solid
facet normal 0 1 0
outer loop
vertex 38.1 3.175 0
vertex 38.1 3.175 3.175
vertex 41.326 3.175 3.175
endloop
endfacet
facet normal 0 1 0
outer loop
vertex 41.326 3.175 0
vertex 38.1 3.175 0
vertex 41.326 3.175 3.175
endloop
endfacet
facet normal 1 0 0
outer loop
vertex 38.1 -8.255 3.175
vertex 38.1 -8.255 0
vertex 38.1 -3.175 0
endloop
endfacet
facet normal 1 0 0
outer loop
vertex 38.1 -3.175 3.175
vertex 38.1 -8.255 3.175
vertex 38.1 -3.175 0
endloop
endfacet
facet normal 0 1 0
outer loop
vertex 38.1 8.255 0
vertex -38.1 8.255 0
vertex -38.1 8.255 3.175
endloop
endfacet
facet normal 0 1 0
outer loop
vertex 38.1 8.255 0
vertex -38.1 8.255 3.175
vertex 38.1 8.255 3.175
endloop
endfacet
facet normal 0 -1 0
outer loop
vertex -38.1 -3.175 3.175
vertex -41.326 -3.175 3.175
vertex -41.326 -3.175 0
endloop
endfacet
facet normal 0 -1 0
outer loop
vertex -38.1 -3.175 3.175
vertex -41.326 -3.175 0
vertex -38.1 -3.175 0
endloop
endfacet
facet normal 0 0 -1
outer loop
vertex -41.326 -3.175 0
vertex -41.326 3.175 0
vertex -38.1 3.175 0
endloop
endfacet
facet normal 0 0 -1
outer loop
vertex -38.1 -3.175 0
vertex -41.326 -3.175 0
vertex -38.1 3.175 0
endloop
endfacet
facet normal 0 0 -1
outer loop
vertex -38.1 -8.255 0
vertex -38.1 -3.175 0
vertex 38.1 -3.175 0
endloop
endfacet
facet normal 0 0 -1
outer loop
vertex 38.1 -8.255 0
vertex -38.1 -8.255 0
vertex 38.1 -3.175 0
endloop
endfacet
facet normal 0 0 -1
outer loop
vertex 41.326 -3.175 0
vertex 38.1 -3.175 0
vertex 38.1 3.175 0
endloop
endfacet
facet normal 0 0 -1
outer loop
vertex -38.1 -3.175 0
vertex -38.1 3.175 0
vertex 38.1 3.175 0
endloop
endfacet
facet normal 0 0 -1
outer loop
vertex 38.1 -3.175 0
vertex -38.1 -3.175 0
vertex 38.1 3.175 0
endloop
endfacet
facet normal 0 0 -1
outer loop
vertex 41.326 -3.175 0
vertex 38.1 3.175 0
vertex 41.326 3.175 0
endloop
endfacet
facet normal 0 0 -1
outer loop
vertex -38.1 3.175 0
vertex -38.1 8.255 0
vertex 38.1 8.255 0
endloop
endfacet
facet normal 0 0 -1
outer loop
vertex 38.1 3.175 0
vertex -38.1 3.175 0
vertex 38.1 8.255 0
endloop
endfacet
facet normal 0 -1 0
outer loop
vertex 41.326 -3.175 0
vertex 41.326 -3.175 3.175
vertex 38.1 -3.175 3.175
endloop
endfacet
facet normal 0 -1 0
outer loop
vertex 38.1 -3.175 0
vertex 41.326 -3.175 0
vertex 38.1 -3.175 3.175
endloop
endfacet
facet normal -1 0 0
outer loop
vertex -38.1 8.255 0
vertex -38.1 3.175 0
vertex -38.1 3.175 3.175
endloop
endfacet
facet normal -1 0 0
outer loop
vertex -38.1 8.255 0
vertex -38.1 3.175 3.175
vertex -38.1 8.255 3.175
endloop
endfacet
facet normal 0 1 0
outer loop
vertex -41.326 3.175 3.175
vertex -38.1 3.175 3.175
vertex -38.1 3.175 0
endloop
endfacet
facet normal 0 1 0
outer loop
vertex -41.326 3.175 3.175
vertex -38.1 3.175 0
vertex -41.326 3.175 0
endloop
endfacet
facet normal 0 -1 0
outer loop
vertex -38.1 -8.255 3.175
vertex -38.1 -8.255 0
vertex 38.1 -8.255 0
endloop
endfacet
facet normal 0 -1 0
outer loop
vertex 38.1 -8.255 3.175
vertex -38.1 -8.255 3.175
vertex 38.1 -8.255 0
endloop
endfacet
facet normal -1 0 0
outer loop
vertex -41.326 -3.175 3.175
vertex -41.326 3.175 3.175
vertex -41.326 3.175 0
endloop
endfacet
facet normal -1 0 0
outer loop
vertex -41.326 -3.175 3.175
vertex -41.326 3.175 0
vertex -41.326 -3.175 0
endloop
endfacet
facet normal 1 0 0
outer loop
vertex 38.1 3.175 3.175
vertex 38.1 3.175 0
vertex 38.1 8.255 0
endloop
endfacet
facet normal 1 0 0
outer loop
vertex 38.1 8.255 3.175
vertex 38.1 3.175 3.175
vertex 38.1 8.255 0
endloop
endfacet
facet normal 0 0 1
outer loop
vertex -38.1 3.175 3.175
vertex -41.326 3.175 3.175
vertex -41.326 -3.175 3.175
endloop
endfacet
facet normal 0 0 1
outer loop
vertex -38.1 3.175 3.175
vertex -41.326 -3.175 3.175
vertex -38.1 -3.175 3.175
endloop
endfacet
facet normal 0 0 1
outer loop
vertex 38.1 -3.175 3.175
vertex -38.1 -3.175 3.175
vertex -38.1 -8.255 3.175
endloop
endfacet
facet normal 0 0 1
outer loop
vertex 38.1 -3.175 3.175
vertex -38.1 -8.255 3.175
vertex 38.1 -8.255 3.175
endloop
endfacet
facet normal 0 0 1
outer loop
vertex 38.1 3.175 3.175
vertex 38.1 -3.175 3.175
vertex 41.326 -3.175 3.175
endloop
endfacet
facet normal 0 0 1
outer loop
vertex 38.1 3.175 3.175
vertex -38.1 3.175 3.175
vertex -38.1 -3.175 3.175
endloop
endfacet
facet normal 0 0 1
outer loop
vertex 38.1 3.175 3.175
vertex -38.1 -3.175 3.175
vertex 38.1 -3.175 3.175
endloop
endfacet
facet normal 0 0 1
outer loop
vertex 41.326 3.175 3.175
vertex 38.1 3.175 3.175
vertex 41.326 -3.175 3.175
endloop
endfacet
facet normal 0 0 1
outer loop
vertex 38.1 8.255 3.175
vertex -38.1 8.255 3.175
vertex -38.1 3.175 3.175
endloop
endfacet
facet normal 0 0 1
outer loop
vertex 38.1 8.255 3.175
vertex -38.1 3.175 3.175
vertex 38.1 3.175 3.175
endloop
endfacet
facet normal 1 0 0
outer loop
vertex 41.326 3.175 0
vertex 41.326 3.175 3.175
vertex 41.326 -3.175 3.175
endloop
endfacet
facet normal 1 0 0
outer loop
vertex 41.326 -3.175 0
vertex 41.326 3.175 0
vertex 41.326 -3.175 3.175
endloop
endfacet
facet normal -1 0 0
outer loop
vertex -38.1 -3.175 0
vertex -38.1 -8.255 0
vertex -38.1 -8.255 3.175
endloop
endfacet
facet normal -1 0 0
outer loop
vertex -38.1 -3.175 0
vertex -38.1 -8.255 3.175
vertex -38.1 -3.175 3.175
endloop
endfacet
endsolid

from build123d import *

# Parameters (mm, degrees)
SKETCH1_W           = 76.2
SKETCH1_H           = 16.51
BOSS_EXTRUDE1_DEPTH = 3.175
BOSS_EXTRUDE2_DEPTH = 3.175


with BuildPart() as part:
    # Sketch1 → Boss-Extrude1 (new body)
    with BuildSketch(Plane.XY):
        Rectangle(SKETCH1_W, SKETCH1_H)
    extrude(amount=BOSS_EXTRUDE1_DEPTH)

    # Sketch3 → Boss-Extrude2 (add)
    with BuildSketch(Plane.XY.offset(3.175)):
        Polygon((-38.1, 0), (-38.1, 3.175), (-41.3258, 3.175), (-41.3258, -3.175), (-38.1, -3.175), align=None)
    boss_extrude2 = extrude(amount=-BOSS_EXTRUDE2_DEPTH)

    # Mirror2: Boss-Extrude2 across plane
    add(boss_extrude2.mirror(Plane(origin=(0, 0, 0), x_dir=(0, 0, 1), z_dir=(1, 0, 0))))


solid = part.part
